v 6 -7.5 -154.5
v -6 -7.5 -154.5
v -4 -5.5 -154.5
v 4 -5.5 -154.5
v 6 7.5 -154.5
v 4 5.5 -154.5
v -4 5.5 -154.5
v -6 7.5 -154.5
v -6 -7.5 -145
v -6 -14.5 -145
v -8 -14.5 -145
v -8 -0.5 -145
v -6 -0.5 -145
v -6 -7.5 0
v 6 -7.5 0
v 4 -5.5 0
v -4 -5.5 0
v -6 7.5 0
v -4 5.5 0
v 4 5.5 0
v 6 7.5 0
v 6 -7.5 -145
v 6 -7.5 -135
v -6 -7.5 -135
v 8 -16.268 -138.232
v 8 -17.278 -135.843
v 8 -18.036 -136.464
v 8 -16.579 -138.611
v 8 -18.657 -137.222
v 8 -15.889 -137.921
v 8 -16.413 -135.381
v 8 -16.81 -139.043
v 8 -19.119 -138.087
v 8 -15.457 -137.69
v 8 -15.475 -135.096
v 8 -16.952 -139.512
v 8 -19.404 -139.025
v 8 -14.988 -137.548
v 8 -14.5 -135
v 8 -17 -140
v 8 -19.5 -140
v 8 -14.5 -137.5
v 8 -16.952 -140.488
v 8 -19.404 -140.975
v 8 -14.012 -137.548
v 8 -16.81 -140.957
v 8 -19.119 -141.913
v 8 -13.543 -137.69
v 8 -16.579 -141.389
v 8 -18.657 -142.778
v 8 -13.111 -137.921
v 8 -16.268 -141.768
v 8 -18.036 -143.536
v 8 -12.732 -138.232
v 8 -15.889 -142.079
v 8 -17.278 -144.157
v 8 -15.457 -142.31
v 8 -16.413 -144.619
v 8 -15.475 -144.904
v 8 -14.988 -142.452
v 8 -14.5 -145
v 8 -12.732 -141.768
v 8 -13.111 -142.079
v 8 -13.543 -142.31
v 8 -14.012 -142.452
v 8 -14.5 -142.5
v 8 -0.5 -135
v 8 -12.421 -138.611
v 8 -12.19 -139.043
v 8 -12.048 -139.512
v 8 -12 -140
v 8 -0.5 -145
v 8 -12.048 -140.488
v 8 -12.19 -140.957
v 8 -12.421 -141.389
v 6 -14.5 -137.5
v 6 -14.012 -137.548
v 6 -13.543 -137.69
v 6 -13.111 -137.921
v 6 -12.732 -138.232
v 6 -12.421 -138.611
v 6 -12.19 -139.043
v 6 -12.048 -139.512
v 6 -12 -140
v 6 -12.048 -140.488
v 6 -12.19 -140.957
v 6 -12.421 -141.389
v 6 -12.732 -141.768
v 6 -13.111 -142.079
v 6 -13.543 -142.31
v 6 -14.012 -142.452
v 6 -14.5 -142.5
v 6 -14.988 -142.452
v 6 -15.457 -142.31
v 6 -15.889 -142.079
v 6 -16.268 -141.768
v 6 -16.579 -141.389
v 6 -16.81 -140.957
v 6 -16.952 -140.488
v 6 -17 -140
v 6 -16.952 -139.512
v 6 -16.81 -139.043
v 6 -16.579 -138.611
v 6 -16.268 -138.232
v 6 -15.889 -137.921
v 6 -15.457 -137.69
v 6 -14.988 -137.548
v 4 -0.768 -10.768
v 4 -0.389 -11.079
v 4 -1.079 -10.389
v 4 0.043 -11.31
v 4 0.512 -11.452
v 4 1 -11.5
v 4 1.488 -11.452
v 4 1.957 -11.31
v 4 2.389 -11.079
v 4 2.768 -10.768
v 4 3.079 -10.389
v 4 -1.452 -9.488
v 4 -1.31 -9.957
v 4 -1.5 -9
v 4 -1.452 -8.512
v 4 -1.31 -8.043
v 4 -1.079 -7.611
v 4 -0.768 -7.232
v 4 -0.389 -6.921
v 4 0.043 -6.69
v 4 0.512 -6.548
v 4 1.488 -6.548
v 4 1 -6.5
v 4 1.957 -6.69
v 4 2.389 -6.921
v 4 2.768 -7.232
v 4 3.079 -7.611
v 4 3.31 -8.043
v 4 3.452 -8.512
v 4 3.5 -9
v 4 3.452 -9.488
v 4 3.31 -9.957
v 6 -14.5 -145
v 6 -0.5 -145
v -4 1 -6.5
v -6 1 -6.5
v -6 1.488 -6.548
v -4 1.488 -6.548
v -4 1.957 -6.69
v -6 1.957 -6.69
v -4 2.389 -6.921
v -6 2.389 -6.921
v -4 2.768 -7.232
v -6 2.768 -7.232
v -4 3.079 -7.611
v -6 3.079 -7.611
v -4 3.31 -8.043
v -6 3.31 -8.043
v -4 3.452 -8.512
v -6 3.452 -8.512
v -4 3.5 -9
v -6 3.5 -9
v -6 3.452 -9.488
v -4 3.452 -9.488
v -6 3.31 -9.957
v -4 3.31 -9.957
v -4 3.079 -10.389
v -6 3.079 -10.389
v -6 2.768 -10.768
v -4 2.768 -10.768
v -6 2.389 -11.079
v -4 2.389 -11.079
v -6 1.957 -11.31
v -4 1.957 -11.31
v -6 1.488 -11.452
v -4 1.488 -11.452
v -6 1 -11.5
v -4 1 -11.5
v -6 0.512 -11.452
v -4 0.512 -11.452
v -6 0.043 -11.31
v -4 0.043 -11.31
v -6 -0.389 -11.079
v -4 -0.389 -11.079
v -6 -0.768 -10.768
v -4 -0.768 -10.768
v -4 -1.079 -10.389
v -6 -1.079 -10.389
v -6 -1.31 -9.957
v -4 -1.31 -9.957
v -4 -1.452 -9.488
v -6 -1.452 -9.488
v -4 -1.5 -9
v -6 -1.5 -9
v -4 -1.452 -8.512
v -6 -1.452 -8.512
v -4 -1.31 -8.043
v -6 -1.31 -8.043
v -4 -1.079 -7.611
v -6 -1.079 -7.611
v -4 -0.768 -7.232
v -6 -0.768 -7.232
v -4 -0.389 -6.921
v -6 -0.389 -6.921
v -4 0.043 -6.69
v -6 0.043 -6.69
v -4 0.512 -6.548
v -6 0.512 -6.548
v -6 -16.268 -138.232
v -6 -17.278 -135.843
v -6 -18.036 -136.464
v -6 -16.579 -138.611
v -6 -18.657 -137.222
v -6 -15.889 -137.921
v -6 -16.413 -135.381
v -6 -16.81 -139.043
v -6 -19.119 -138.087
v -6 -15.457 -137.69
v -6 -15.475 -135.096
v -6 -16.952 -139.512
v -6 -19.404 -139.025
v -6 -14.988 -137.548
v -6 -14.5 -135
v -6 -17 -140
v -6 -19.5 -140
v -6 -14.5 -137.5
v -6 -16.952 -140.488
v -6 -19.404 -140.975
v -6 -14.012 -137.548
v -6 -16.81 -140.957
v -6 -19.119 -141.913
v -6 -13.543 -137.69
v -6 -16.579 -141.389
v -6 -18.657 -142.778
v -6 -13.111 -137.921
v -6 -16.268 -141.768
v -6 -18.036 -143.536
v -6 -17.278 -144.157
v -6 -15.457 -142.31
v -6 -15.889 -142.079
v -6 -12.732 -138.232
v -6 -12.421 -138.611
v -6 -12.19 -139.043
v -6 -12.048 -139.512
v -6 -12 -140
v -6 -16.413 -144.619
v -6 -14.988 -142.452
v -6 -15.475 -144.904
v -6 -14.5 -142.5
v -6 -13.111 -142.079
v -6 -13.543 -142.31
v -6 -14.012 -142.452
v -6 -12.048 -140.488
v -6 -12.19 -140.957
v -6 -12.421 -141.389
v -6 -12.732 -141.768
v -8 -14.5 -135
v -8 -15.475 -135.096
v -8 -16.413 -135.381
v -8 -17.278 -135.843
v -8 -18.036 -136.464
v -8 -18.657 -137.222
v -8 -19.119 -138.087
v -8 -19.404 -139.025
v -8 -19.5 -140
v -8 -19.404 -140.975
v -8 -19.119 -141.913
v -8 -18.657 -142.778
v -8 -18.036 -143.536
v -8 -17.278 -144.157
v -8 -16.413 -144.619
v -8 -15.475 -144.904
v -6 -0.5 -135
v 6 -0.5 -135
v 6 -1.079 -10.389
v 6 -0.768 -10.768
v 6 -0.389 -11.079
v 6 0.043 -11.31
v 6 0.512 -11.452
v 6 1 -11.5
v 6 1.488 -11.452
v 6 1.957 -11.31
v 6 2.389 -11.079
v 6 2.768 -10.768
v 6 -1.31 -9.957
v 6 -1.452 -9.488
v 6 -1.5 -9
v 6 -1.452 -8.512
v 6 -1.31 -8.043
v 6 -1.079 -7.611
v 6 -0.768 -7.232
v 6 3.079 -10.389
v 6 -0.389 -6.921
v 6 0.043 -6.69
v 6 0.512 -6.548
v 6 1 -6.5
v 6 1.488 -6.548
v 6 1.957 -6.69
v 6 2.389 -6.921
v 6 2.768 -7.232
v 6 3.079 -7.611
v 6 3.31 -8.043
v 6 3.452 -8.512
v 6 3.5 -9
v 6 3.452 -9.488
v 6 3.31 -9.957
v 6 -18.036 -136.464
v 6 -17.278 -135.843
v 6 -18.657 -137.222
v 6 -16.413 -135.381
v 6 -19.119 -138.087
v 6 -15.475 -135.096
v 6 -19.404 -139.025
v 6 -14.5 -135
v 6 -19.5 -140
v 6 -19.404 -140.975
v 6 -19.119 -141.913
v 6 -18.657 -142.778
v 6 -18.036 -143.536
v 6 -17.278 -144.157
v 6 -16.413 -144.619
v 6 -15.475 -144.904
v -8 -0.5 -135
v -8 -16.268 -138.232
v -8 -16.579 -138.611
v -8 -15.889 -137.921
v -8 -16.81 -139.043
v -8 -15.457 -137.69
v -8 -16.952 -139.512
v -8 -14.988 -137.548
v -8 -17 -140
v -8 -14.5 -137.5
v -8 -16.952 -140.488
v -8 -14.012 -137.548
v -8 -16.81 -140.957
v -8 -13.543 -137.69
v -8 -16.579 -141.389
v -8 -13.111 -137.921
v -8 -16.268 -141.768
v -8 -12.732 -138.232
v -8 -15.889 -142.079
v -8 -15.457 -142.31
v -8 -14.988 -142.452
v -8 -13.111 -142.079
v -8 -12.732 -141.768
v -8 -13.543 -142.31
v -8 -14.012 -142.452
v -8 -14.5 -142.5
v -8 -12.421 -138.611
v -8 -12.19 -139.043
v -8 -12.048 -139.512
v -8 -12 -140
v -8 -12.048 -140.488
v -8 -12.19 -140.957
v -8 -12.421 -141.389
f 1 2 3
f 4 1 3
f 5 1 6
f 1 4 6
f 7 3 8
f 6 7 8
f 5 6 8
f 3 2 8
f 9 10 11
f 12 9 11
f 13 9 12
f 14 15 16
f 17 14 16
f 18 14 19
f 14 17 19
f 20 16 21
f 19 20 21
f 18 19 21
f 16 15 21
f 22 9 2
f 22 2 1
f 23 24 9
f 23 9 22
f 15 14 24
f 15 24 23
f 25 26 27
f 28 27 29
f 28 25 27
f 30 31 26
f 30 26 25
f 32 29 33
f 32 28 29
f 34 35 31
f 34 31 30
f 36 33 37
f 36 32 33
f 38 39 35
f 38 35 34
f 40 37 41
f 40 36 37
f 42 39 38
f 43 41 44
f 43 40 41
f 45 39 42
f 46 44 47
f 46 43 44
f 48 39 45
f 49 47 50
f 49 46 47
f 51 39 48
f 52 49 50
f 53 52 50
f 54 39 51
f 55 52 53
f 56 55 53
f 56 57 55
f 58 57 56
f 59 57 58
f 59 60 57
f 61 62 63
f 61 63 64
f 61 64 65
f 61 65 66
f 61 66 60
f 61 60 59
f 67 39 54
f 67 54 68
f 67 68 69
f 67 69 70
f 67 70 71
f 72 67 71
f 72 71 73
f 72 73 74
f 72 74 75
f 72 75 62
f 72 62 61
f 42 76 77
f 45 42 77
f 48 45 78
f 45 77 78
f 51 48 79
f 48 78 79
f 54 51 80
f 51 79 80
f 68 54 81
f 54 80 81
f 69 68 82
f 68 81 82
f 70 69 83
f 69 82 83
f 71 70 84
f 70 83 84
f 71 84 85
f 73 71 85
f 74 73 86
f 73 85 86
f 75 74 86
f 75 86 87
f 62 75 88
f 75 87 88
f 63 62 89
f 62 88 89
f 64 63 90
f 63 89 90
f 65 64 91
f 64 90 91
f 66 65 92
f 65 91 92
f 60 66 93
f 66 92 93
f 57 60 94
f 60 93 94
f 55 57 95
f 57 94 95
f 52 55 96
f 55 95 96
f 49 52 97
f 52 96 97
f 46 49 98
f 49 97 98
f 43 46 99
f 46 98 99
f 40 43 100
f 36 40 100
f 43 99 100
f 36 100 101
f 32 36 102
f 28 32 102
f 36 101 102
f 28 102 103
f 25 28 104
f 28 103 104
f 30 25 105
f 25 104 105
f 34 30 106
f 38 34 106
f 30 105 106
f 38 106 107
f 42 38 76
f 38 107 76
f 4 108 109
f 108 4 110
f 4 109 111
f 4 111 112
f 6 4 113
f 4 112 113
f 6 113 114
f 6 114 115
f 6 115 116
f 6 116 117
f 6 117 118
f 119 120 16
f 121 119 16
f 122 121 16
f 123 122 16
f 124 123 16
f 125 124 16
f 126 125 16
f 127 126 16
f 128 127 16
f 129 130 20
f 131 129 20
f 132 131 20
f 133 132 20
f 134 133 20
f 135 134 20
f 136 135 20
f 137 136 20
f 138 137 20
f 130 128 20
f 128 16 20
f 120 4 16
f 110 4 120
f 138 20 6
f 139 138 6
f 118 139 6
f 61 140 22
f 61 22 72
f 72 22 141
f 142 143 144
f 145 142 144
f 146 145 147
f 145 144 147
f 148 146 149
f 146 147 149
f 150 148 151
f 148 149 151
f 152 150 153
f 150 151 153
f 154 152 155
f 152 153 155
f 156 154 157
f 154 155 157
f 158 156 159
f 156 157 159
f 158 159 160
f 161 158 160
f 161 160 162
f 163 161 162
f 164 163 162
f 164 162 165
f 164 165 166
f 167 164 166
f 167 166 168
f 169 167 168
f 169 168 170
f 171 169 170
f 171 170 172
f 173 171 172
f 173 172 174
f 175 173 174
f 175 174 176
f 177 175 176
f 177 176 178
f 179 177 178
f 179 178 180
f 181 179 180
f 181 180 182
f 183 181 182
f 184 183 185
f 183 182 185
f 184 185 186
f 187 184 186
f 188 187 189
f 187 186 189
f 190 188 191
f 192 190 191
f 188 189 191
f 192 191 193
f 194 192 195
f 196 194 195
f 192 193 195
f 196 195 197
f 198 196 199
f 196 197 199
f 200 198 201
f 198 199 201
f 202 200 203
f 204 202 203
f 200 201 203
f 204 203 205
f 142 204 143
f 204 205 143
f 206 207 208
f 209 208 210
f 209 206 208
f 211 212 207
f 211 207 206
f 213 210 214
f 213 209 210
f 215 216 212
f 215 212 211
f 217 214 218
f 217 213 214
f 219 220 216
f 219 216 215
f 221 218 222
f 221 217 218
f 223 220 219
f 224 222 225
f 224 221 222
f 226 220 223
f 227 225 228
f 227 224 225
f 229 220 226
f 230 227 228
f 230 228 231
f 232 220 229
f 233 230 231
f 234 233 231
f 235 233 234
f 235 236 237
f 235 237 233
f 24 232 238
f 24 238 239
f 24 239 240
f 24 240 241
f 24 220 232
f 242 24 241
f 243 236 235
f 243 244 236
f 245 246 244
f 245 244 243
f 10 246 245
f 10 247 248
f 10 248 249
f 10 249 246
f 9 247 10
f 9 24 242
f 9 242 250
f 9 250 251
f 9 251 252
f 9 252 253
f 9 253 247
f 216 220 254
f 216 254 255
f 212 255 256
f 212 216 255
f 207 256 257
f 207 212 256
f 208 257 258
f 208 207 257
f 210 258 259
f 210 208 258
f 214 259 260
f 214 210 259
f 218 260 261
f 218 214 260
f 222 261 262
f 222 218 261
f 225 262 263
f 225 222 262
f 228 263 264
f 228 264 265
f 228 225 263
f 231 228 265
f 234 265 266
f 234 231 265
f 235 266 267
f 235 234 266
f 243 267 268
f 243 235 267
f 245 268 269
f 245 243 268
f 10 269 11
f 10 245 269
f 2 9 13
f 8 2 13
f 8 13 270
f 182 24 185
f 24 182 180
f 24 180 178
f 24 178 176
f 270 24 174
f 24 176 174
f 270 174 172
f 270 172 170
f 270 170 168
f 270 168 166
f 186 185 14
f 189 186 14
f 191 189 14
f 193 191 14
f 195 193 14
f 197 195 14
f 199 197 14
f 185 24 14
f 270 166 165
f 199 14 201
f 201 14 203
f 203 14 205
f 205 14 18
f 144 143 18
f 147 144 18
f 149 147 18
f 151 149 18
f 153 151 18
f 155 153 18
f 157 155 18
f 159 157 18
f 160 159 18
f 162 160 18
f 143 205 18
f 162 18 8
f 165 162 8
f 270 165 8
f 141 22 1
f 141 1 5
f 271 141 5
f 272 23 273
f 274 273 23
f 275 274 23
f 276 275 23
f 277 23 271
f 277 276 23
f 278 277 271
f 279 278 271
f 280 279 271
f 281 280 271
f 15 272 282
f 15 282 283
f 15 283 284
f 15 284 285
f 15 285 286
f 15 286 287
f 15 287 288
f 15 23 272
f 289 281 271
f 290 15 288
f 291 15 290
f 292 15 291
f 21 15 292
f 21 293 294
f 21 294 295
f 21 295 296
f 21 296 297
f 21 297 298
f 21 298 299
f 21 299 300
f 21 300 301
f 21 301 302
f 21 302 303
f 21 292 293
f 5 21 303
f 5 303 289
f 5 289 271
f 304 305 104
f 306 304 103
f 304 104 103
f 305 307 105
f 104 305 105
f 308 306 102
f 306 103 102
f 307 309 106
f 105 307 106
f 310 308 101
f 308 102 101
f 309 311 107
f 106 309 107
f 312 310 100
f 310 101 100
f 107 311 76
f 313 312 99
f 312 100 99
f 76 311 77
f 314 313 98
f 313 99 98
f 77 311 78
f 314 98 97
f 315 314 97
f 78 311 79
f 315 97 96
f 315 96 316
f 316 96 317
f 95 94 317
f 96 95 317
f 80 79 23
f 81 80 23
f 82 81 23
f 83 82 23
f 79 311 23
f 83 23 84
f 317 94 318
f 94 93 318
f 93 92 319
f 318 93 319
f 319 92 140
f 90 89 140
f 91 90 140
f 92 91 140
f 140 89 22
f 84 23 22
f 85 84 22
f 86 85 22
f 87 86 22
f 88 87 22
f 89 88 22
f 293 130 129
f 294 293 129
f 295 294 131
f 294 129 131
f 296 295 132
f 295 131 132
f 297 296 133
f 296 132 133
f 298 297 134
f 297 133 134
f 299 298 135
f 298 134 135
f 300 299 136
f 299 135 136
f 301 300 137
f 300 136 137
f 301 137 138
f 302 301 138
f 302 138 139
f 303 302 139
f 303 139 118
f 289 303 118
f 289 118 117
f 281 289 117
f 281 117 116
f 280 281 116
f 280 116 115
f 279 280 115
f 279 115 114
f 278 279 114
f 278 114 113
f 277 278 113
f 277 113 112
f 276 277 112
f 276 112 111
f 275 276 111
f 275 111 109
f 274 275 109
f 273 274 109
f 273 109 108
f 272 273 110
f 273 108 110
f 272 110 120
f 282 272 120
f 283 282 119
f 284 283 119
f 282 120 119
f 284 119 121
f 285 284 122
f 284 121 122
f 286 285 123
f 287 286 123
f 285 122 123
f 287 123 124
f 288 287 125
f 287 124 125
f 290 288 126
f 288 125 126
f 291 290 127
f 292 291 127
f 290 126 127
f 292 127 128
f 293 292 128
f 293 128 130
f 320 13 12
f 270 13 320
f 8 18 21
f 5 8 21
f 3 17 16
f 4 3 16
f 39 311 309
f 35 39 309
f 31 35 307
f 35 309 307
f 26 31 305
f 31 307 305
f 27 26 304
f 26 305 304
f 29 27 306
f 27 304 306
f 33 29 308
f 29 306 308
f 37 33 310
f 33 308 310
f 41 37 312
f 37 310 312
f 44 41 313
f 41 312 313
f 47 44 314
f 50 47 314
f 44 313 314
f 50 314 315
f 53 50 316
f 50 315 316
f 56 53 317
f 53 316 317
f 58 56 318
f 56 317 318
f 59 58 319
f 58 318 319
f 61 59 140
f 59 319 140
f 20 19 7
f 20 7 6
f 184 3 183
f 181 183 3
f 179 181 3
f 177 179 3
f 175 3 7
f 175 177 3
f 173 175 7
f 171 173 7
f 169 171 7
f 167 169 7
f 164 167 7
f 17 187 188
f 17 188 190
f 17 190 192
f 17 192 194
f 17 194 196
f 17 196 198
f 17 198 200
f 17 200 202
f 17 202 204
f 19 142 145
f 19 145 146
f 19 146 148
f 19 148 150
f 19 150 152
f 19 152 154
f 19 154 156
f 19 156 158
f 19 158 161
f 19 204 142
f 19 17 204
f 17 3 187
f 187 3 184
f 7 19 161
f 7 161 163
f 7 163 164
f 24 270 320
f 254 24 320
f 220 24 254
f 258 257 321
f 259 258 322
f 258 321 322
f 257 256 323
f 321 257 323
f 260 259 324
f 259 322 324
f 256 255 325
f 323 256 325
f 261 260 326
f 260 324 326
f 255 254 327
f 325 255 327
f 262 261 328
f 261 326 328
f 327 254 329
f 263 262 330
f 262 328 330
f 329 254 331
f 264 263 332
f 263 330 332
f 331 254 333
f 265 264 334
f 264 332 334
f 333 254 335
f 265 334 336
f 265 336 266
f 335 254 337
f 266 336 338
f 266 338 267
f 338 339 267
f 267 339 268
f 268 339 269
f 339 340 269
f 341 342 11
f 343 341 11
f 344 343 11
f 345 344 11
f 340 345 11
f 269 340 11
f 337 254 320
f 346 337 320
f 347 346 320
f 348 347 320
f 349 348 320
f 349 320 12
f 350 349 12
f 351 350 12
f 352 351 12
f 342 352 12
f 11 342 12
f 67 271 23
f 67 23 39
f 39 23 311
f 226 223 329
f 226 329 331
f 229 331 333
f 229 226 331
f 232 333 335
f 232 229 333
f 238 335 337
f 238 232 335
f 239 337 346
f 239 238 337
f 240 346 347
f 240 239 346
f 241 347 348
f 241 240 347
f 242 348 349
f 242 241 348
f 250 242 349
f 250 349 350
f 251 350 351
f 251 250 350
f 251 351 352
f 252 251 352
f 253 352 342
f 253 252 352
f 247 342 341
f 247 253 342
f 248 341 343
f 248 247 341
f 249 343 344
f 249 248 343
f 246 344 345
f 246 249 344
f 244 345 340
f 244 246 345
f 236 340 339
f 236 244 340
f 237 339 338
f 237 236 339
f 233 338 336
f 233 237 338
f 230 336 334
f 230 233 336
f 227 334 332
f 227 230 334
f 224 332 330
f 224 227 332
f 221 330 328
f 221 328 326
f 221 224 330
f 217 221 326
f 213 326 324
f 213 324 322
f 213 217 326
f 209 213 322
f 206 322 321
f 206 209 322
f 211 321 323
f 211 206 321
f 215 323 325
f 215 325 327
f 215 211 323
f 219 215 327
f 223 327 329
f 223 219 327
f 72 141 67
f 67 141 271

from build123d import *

# Parameters (mm, degrees)
CROQUIS1_W                = 12
CROQUIS1_H                = 15
CROQUIS1_W_2              = 8
CROQUIS1_H_2              = 11
SALIENTE_EXTRUIR1_DEPTH   = 159.5
CROQUIS2_R                = 2.5
SALIENTE_EXTRUIR2_DEPTH   = 2
SIMETR_A2_COPY_1_SKETCH_R = 2.5
SIMETR_A2_COPY_1_DEPTH    = 2
SKETCH1_W                 = 159.5
SKETCH1_H                 = 34.305734292
CUT_EXTRUDE1_DEPTH        = 3
CUT_EXTRUDE1_DEPTH_BACK   = 15
SKETCH5_R                 = 2.5
CUT_EXTRUDE2_DEPTH        = 15
SKETCH6_W                 = 5
SKETCH6_H                 = 15
CUT_EXTRUDE3_DEPTH        = 3
CUT_EXTRUDE3_DEPTH_BACK   = 15


with BuildPart() as part:
    # Croquis1 → Saliente-Extruir1 (new body, symmetric)
    with BuildSketch(Plane.XY):
        Rectangle(CROQUIS1_W, CROQUIS1_H)
        Rectangle(CROQUIS1_W_2, CROQUIS1_H_2, mode=Mode.SUBTRACT)
    extrude(amount=SALIENTE_EXTRUIR1_DEPTH, both=True)

    # Croquis2 → Saliente-Extruir2 (add)
    with BuildSketch(Plane(origin=(6, 0, 0), x_dir=(0, 0, -1), z_dir=(1, 0, 0))):
        with BuildLine():
            Line((-145, -14.5), (-145, -0.5))
            Line((-145, -0.5), (-135, -0.5))
            Line((-135, -0.5), (-135, -14.5))
            ThreePointArc((-135, -14.5), (-140, -19.5), (-145, -14.5))
        make_face()
        with Locations((-140, -14.5)):
            Circle(CROQUIS2_R, mode=Mode.SUBTRACT)
    saliente_extruir2 = extrude(amount=SALIENTE_EXTRUIR2_DEPTH)

    # Simetría1: Saliente-Extruir2 across plane
    add(saliente_extruir2.mirror(Plane(origin=(0, 0, 0), x_dir=(0, 0, 1), z_dir=(1, 0, 0))))

    # Simetría2: Saliente-Extruir2 across plane
    add(saliente_extruir2.mirror(Plane.XY))

    # Simetría2 copy 1 sketch → Simetría2 copy 1 (add)
    with BuildSketch(Plane.ZY.offset(6)):
        with BuildLine():
            Line((-145, -14.5), (-145, -0.5))
            Line((-145, -0.5), (-135, -0.5))
            Line((-135, -0.5), (-135, -14.5))
            ThreePointArc((-135, -14.5), (-140, -19.5), (-145, -14.5))
        make_face()
        with Locations((-140, -14.5)):
            Circle(SIMETR_A2_COPY_1_SKETCH_R, mode=Mode.SUBTRACT)
    extrude(amount=SIMETR_A2_COPY_1_DEPTH)

    # Sketch1 → Cut-Extrude1 (cut, two sides)
    with BuildSketch(Plane(origin=(6, 0, 0), x_dir=(0, 0, -1), z_dir=(1, 0, 0))) as cut_extrude1_sk:
        with Locations((-79.75, -9.652867146)):
            Rectangle(SKETCH1_W, SKETCH1_H)
    extrude(amount=CUT_EXTRUDE1_DEPTH, mode=Mode.SUBTRACT)
    extrude(cut_extrude1_sk.sketch, amount=-CUT_EXTRUDE1_DEPTH_BACK, mode=Mode.SUBTRACT)

    # Sketch5 → Cut-Extrude2 (cut, through all)
    with BuildSketch(Plane.ZY.offset(6)):
        with Locations((-9, 1)):
            Circle(SKETCH5_R)
    extrude(amount=-CUT_EXTRUDE2_DEPTH, mode=Mode.SUBTRACT)

    # Sketch6 → Cut-Extrude3 (cut, two sides)
    with BuildSketch(Plane.ZY.offset(6)) as cut_extrude3_sk:
        with Locations((-157, 0)):
            Rectangle(SKETCH6_W, SKETCH6_H)
    extrude(amount=CUT_EXTRUDE3_DEPTH, mode=Mode.SUBTRACT)
    extrude(cut_extrude3_sk.sketch, amount=-CUT_EXTRUDE3_DEPTH_BACK, mode=Mode.SUBTRACT)


solid = part.part
